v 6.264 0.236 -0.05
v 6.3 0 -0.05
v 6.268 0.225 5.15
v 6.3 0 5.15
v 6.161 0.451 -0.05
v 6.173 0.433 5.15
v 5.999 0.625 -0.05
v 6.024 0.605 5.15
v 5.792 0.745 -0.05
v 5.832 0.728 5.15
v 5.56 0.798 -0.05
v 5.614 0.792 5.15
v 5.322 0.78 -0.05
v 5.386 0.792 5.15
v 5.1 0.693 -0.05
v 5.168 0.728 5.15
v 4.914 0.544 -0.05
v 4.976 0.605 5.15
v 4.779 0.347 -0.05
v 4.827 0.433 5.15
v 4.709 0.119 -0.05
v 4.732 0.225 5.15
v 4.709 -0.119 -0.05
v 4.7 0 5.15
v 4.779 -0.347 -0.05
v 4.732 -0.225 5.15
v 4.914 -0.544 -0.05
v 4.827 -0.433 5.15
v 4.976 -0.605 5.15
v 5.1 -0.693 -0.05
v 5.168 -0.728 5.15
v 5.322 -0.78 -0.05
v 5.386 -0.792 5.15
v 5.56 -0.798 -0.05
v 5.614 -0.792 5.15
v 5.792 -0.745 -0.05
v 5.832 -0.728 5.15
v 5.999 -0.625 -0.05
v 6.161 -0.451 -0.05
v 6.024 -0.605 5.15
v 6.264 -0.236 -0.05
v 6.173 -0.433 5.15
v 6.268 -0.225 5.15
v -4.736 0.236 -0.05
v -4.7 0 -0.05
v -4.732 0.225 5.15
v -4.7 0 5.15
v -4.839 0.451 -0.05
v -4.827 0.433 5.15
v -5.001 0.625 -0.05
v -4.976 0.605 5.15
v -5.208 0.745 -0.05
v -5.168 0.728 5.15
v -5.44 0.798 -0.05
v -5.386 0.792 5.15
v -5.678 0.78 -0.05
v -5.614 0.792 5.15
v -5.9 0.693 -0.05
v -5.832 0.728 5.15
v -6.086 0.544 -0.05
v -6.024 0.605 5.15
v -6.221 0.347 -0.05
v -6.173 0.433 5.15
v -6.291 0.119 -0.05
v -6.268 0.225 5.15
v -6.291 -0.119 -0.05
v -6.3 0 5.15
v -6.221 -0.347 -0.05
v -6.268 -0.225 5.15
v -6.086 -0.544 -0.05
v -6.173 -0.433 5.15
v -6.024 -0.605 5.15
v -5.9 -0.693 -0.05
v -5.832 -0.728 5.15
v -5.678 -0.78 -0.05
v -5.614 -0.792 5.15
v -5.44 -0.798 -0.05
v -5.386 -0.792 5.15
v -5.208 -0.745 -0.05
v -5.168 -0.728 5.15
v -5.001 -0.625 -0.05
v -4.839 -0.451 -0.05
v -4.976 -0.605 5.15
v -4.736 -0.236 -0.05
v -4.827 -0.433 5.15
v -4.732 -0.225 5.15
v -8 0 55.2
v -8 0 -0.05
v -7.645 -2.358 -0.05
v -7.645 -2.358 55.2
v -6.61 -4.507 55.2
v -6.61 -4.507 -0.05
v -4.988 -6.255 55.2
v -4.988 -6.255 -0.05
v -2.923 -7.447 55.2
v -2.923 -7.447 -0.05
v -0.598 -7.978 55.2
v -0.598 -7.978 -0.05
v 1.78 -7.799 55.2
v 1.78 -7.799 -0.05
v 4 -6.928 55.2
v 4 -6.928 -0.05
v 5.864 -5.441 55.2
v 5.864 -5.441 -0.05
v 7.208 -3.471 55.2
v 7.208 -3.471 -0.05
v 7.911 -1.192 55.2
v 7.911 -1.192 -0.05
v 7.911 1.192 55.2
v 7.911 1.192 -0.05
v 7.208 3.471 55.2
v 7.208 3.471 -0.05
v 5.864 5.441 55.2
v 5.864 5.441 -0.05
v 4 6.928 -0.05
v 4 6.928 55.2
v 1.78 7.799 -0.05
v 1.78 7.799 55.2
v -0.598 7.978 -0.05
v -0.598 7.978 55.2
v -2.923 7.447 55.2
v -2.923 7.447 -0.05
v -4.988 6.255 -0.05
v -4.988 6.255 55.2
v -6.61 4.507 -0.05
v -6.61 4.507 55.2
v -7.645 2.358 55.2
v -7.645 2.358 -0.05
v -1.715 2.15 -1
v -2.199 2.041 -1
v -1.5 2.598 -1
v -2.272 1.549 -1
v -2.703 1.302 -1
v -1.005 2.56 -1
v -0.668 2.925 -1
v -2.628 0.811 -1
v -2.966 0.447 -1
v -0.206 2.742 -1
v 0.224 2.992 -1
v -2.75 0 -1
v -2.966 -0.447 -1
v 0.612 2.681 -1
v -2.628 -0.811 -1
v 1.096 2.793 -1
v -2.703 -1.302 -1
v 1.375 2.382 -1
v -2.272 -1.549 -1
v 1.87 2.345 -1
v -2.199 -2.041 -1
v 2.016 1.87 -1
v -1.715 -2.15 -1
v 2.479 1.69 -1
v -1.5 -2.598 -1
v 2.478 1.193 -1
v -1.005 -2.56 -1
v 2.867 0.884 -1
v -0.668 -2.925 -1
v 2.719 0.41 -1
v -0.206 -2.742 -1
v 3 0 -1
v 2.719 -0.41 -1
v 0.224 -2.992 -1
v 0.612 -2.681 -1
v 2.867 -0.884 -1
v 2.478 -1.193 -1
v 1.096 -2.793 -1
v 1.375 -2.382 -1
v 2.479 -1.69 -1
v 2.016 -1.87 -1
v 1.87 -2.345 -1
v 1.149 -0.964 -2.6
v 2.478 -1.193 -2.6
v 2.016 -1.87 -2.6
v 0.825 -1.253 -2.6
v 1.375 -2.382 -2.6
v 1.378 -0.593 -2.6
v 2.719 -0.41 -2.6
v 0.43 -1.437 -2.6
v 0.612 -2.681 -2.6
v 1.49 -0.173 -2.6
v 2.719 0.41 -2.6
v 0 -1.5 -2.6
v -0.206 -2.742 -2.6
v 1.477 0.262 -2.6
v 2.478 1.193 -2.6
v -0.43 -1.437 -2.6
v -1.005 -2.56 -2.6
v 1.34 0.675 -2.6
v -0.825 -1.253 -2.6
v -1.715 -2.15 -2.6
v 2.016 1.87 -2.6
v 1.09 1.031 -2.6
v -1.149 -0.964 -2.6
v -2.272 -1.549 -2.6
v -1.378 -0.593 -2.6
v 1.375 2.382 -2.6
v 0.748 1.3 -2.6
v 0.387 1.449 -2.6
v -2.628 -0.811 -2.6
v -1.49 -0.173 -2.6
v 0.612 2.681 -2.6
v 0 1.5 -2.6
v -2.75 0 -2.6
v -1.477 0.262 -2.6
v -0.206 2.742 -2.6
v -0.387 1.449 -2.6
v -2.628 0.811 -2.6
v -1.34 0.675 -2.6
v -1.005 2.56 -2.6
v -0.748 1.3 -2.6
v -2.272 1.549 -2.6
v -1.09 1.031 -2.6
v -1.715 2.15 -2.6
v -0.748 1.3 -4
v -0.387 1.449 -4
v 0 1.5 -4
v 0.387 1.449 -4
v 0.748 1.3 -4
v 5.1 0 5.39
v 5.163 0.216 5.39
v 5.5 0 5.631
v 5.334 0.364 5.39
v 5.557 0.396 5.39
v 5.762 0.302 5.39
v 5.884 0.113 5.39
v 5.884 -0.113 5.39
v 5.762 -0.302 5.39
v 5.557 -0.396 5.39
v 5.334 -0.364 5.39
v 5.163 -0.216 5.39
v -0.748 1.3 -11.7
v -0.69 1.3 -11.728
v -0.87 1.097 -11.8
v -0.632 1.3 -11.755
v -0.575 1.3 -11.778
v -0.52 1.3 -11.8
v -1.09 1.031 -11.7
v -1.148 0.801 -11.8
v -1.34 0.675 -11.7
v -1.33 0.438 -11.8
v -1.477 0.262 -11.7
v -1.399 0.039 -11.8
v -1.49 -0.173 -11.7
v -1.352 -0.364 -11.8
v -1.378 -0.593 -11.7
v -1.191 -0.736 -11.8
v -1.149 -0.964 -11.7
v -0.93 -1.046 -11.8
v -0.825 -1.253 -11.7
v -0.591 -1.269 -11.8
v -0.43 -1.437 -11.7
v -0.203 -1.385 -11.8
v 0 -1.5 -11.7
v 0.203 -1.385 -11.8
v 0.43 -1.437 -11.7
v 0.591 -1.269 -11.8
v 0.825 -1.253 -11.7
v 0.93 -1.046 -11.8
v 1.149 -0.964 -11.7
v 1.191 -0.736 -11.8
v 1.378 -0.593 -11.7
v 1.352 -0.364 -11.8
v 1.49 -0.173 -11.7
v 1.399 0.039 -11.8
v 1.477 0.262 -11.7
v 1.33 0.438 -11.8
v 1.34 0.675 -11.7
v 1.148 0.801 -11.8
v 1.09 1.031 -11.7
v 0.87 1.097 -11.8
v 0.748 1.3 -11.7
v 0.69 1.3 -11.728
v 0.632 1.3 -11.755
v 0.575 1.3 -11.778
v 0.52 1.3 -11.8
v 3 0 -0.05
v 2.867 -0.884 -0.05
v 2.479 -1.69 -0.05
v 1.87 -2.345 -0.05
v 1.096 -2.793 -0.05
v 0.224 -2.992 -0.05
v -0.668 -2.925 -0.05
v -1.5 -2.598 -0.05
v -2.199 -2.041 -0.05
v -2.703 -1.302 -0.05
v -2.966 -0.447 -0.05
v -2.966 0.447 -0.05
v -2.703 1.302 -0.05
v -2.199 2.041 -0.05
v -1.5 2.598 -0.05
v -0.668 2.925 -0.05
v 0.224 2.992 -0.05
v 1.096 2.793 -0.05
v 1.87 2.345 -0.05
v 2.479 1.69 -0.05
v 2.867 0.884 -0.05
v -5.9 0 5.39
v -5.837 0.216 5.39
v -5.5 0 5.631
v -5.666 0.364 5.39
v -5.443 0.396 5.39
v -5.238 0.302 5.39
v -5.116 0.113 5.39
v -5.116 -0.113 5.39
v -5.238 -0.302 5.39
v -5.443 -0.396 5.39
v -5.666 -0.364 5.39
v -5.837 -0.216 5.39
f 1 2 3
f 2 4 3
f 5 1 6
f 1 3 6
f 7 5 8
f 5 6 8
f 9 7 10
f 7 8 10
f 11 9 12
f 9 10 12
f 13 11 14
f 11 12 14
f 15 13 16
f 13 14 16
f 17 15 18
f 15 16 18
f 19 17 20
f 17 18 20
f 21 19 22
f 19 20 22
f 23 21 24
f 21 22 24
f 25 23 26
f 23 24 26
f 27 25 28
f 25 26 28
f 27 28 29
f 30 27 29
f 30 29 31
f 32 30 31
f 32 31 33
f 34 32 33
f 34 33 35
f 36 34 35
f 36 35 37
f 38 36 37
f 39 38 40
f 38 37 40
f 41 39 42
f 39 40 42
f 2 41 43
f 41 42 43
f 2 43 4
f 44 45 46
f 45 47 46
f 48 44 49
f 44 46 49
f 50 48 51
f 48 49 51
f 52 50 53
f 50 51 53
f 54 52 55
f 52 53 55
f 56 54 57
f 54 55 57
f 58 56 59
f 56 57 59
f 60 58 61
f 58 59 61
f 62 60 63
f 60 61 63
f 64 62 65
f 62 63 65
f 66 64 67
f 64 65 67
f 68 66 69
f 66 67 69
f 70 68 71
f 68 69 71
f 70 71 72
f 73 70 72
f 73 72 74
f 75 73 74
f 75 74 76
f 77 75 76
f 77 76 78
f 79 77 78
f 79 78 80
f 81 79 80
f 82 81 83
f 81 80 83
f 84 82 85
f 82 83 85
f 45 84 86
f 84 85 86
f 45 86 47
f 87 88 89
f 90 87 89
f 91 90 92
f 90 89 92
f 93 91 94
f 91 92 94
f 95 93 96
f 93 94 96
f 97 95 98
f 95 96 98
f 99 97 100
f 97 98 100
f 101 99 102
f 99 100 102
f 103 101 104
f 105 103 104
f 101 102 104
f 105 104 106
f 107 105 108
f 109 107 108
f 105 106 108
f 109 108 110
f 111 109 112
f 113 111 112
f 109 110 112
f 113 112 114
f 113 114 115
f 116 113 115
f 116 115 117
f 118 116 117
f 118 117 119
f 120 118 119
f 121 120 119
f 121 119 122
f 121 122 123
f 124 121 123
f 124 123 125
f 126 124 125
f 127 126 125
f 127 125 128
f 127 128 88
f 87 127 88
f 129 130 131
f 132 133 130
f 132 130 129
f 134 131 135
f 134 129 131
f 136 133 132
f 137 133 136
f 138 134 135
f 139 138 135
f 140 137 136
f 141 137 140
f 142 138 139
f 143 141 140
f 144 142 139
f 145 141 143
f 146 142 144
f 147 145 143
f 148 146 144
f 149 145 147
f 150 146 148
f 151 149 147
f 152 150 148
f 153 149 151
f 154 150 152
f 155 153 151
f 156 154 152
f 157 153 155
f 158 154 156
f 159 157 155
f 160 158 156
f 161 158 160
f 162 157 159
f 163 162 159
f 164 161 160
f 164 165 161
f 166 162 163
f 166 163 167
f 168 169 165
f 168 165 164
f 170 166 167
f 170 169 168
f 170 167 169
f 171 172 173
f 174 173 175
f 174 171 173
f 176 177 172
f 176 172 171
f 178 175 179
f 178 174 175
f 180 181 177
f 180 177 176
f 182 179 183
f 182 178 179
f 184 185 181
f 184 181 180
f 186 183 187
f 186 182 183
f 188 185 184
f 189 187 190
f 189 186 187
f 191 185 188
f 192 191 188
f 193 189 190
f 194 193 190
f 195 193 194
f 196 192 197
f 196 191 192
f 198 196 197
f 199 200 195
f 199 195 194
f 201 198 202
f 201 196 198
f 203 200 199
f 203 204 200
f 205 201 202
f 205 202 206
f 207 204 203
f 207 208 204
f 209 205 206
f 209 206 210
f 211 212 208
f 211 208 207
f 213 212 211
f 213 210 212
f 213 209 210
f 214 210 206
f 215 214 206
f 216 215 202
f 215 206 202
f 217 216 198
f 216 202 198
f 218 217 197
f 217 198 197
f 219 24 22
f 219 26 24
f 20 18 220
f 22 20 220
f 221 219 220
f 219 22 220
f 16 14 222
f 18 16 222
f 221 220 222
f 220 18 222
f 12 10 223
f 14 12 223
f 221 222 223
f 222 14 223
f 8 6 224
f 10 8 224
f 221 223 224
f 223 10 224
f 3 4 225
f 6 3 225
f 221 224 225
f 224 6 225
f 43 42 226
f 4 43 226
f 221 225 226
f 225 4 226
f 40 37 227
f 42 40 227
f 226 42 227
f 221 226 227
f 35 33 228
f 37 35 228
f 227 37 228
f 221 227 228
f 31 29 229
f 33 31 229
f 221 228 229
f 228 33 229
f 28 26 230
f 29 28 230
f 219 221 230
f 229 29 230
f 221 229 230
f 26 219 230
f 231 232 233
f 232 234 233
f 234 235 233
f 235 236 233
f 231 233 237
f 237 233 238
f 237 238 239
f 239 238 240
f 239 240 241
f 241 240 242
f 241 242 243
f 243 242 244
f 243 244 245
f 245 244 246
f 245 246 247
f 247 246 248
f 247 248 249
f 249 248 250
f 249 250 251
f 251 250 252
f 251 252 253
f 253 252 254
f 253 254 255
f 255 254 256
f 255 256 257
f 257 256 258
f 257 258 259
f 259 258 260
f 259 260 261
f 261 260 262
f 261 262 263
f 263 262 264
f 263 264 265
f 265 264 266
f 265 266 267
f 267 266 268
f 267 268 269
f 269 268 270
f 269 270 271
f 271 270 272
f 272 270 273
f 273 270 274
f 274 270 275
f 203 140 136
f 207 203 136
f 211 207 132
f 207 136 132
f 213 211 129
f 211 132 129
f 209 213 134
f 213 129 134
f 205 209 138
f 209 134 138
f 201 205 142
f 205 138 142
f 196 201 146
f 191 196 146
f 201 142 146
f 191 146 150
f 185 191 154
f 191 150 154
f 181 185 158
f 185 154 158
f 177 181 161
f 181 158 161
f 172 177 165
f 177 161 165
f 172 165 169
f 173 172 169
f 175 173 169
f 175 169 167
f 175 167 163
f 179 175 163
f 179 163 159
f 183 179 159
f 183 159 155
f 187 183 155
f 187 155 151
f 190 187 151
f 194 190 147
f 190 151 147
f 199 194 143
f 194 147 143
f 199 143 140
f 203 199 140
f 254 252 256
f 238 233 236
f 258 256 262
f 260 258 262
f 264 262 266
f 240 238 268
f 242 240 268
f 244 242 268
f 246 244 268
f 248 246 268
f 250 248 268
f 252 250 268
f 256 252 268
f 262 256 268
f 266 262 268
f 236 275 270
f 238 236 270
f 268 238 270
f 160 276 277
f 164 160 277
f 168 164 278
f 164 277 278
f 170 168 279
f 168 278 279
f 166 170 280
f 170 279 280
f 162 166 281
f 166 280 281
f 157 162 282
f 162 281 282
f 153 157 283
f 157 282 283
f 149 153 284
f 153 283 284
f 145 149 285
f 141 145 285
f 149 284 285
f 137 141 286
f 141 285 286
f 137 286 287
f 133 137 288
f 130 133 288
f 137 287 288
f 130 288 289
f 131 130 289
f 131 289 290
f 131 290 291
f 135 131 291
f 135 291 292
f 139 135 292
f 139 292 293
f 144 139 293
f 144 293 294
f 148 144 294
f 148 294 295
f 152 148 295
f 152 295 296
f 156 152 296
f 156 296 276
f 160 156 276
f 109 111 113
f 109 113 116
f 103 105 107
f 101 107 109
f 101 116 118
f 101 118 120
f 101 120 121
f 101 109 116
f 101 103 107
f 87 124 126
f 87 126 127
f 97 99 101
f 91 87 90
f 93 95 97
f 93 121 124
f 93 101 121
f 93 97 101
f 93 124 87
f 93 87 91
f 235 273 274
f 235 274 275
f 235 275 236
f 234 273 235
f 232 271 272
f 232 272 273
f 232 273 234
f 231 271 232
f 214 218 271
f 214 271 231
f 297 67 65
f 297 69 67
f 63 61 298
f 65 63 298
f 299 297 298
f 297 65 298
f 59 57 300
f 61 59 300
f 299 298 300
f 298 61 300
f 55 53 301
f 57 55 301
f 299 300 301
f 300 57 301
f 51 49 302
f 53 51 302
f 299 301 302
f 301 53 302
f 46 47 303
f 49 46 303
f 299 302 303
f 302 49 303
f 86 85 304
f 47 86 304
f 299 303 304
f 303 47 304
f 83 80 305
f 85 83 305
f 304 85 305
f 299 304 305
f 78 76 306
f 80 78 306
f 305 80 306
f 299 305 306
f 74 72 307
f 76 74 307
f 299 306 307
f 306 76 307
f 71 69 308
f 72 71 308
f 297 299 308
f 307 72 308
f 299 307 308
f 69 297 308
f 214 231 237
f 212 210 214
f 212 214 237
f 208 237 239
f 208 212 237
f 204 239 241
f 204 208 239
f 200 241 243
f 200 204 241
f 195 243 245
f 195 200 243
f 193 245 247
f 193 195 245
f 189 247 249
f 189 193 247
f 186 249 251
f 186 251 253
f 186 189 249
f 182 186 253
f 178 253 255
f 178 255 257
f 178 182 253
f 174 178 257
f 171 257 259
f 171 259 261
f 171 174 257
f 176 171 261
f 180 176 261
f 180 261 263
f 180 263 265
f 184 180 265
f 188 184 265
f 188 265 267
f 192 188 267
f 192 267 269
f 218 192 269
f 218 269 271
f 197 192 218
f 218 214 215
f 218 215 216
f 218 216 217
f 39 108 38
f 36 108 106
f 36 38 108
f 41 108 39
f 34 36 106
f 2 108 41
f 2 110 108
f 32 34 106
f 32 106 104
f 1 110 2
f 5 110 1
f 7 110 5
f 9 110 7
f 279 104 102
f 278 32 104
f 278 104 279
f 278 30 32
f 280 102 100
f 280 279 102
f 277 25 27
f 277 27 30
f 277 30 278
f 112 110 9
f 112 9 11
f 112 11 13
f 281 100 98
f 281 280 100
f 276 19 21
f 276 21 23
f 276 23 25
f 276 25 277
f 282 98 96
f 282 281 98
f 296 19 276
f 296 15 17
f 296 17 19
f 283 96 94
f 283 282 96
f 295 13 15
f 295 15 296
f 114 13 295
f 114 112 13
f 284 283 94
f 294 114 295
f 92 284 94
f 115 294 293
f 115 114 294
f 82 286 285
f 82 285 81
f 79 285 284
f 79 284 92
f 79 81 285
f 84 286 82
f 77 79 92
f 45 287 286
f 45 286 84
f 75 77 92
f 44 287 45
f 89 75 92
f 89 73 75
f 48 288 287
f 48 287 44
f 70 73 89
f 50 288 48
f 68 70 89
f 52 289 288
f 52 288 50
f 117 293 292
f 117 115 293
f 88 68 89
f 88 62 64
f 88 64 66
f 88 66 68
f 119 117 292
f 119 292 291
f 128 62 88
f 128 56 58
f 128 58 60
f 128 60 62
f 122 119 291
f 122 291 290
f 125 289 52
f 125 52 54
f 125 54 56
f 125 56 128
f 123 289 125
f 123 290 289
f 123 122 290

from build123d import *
from build123d.topology import SkipClean

# Parameters (mm, degrees)
SKETCH_1_R             = 8
EXTRUDE_1_DEPTH        = 55.2
EXTRUDE_2_DEPTH        = 11.8
SKETCH_3_R             = 3
EXTRUDE_3_DEPTH        = 1
SKETCH_4_R             = 2.75
EXTRUDE_4_DEPTH        = 1.6
EXTRUDE_5_DEPTH        = 0.05
EXTRUDE_5_DEPTH_BACK   = 2
SKETCH_5_R             = 8
HOLE_WIZARD_M2_1_D     = 1.6
HOLE_WIZARD_M2_1_DEPTH = 5.2
HOLE_WIZARD_M2_1_TIP   = 0.480688495
SKETCH1_R              = 1.5
EXTRUDE1_DEPTH         = 1.4
CHAMFER_2_SIZE         = 0.1


with BuildPart() as part:
    # 草图1 → 拉伸1 (new body)
    with BuildSketch(Plane.XY):
        with Locations(Location((0, 0, 0), (0, 0, 180))):
            Circle(SKETCH_1_R)
    extrude(amount=EXTRUDE_1_DEPTH)

    # 草图2 → 拉伸2 (add)
    with BuildSketch(Plane(origin=(0, 0, 0), x_dir=(-1, 0, 0), z_dir=(0, 0, -1))):
        with BuildLine():
            Line((-0.748331477, 1.3), (0.748331477, 1.3))
            ThreePointArc((0.748331477, 1.3), (0, -1.5), (-0.748331477, 1.3))
        make_face()
    extrude(amount=EXTRUDE_2_DEPTH)

    # 草图3 → 拉伸3 (add)
    with BuildSketch(Plane(origin=(0, 0, 0), x_dir=(-1, 0, 0), z_dir=(0, 0, -1))):
        with Locations(Location((0, 0, 0), (0, 0, 180))):
            Circle(SKETCH_3_R)
    extrude(amount=EXTRUDE_3_DEPTH)

    # 草图4 → 拉伸4 (add)
    with BuildSketch(Plane(origin=(0, 0, -1), x_dir=(-1, 0, 0), z_dir=(0, 0, -1))):
        Circle(SKETCH_4_R)
    extrude(amount=EXTRUDE_4_DEPTH)

    # 草图5 → 拉伸5 (add, two sides: drawn at the far end of the back side and taken through both)
    with BuildSketch(Plane(origin=(0, 0, 0), x_dir=(-1, 0, 0), z_dir=(0, 0, -1)).offset(-EXTRUDE_5_DEPTH_BACK)):
        Circle(SKETCH_5_R)
    extrude(amount=EXTRUDE_5_DEPTH + EXTRUDE_5_DEPTH_BACK)

    # M2 螺纹孔1
    with Locations(Plane(origin=(5.5, 0, -0.05), x_dir=(-1, 0, 0), z_dir=(0, 0, -1))):
        with Locations((0, 0), (11, 0)):
            Hole(HOLE_WIZARD_M2_1_D / 2, depth=HOLE_WIZARD_M2_1_DEPTH)
            with Locations((0, 0, -(HOLE_WIZARD_M2_1_DEPTH + HOLE_WIZARD_M2_1_TIP / 2))):  # 118° drill point
                Cone(0, HOLE_WIZARD_M2_1_D / 2, HOLE_WIZARD_M2_1_TIP, mode=Mode.SUBTRACT)

    # Sketch1 → Extrude1 (add)
    with SkipClean():  # the faces are left unmerged after this step: merging them gives an invalid solid
        with BuildSketch(Plane(origin=(0, 0, -2.6), x_dir=(-1, 0, 0), z_dir=(0, 0, -1))):
            with Locations(Location((0, 0, 0), (0, 0, 119.926434867))):
                Circle(SKETCH1_R)
        extrude(amount=EXTRUDE1_DEPTH)

    # 倒角2
    chamfer_2_edges = [part.edges().sort_by_distance(p)[0] for p in [
        (0, -1.5, -11.8),
    ]]
    chamfer(chamfer_2_edges, length=CHAMFER_2_SIZE)


solid = part.part
